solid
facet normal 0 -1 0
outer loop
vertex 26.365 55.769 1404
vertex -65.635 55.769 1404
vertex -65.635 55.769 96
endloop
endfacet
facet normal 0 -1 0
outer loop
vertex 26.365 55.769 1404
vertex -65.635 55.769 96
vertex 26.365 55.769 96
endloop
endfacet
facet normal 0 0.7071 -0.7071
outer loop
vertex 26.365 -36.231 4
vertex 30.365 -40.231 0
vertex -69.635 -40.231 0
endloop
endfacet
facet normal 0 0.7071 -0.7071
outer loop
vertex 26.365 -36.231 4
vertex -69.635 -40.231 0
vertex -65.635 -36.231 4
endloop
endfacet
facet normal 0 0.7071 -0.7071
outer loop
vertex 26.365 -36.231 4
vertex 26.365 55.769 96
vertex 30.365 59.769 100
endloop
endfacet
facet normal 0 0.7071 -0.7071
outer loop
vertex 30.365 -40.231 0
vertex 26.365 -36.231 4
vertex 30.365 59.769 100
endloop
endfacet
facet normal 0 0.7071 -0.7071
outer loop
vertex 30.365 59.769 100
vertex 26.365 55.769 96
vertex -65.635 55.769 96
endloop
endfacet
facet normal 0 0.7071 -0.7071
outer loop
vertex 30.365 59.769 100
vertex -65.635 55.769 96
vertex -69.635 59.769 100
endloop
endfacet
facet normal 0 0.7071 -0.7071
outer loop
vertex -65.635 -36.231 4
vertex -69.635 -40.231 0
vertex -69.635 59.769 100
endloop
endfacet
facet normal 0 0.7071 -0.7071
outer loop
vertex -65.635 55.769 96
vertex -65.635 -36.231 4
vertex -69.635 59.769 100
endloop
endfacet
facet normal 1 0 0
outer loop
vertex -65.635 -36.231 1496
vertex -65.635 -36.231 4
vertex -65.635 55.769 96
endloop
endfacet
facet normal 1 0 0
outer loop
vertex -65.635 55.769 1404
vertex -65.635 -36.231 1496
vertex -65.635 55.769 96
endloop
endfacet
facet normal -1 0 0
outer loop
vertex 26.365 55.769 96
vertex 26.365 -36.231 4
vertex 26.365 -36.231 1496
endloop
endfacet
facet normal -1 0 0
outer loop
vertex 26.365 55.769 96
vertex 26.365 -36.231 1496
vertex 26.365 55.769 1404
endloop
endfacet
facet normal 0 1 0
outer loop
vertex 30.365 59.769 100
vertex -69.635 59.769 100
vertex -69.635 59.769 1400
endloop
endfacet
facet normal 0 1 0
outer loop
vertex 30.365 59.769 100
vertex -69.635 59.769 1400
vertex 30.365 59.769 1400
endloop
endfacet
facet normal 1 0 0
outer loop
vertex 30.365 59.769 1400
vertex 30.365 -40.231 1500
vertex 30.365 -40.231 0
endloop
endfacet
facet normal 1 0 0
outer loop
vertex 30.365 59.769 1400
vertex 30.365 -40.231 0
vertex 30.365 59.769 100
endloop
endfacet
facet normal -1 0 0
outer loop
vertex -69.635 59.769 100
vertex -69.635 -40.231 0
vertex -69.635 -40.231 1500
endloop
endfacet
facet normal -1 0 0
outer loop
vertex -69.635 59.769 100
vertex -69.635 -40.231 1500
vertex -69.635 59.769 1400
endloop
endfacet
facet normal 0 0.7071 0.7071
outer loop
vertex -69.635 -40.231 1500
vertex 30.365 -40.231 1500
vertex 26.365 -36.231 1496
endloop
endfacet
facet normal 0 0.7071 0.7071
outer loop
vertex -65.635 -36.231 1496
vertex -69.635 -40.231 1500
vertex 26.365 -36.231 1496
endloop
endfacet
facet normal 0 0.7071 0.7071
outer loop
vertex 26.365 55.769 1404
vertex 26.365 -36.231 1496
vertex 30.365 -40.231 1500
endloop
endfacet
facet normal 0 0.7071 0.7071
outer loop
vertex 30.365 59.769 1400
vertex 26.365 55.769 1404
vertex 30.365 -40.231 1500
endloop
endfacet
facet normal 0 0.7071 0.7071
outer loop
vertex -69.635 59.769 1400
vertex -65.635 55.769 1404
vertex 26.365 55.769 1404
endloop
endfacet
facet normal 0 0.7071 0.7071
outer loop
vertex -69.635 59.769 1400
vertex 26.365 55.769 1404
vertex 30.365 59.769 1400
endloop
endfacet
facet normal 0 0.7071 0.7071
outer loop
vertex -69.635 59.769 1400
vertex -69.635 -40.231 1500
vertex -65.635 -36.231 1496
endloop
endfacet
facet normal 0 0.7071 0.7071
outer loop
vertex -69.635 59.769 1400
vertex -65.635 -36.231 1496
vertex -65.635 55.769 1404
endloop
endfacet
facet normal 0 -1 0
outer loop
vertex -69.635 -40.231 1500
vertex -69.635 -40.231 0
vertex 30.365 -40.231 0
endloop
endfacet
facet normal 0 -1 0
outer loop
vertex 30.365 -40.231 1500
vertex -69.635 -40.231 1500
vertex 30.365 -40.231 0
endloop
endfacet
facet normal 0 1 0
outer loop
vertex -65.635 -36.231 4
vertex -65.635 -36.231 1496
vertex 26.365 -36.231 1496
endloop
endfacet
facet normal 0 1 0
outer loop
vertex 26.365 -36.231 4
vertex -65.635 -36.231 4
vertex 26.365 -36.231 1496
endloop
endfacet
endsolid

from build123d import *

# Parameters (mm, degrees)
CROQUIS1_W              = 100
CROQUIS1_H              = 100
CROQUIS1_W_2            = 92
CROQUIS1_H_2            = 92
SALIENTE_EXTRUIR2_DEPTH = 1500
CORTAR_EXTRUIR2_DEPTH   = 180


with BuildPart() as part:
    # Croquis1 → Saliente-Extruir2 (new body)
    with BuildSketch(Plane.XY):
        with Locations((-19.634513149, 9.769055649)):
            Rectangle(CROQUIS1_W, CROQUIS1_H)
        with Locations((-19.634513149, 9.769055649)):
            Rectangle(CROQUIS1_W_2, CROQUIS1_H_2, mode=Mode.SUBTRACT)
    extrude(amount=SALIENTE_EXTRUIR2_DEPTH)

    # Croquis2 → Cortar-Extruir2 (cut)
    with BuildSketch(Plane.ZY.offset(69.634513149)):
        Polygon((1500, -40.230944351), (1400, 59.769055649), (1500, 59.769055649), align=None)
        Polygon((0, -40.230944351), (100, 59.769055649), (0, 59.769055649), align=None)
    extrude(amount=-CORTAR_EXTRUIR2_DEPTH, mode=Mode.SUBTRACT)


solid = part.part
